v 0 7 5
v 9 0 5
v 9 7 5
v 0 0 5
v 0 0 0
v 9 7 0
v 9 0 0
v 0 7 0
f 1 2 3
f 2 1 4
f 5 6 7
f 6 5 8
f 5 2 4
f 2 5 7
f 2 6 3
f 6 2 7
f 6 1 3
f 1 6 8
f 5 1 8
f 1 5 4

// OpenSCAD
// Generated by SolidPython 1.0.1 on 2020-07-29 00:46:55


cube(size = [9, 7, 5]);
/***********************************************
*********      SolidPython code:      **********
************************************************
 
# import packages: SolidPython
from solid import *
from solid.utils import *
from itertools import chain, combinations, permutations


class Resize:

    def __init__(self, scad_file):
        self.scad_file = scad_file
        #self.scad_file = import_scad(scad_file)
        # cone/cylinder param:
        self.r1 = 0
        self.r2 = 0
        self.h = 0
        # rectangular prism param:
        self.w = 0
        self.l = 0
        # ellipse param:
        self.r = 0

    # import OpenScad code (file name corresponds to shape)


    # classify shape + parameters
    def assign(self, param1, param2, param3):
        if self.scad_file == 'cone.scad':
            self.r1 = param1
            self.r2 = param2
            self.h = param3
        elif self.scad_file == 'cylinder.scad':
            self.r1 = param1
            self.r2 = param2
            self.h = param3
        elif self.scad_file == 'rectangularPrism.scad':
            self.h = param1
            self.l = param2
            self.w = param3
        else:
            self.r = param1
            self.h = param2

    # resize parameters
    def iterate(self):
        x = range(3, 20, 2)
        i = 1
        if self.scad_file == 'cone.scad':
            tempList = list(permutations(x, 2))
            for temp in tempList:
                param1 = temp[0]
                param2 = temp[1]
                filepath = 'produced_scad_files/' + 'cone' + str(param1) + '_' + str(param2) + '_' + '.scad'
                scad_render_to_file(cylinder(h=param1, r1=param2, r2=0), filepath)

        elif self.scad_file == 'cylinder.scad':
            tempList = list(permutations(x, 3))
            for temp in tempList:
                param1 = temp[0]
                param2 = temp[1]
                filepath = 'produced_scad_files/' + 'cylinder' + str(param1) + '_' + str(param2) + '_' + '.scad'
                scad_render_to_file(cylinder(h=param1, r1=param2, r2=param2), filepath)

        elif self.scad_file == 'rectangularPrism.scad':
            tempList = list(permutations(x, 3))
            for temp in tempList:
                param1 = temp[0]
                param2 = temp[1]
                param3 = temp[2]
                filepath = 'produced_scad_files/' + 'rectangularPrism' + str(param1) + '_' + str(param2) + '_' + str(
                    param3) + '.scad'
                scad_render_to_file(cube(size=(param1, param2, param3)), filepath)

        elif self.scad_file == 'ellipse.scad':
            tempList = list(permutations(x, 4))
            for temp in tempList:
                param1 = temp[0]
                param2 = temp[1]
                param3 = temp[2]
                param4 = temp[3]
                filepath = 'produced_scad_files/' + 'ellipse' + str(param1) + '_' + str(param2) + '_' + str(param3) + '_' + str(param4) + '.scad'
                scad_render_to_file(scale([param1, param2, param3])(sphere(r=param4)), filepath)

    def render_to_scadfile(self):
        scad_render_to_file(scad, 'example.scad') 
 
************************************************/
